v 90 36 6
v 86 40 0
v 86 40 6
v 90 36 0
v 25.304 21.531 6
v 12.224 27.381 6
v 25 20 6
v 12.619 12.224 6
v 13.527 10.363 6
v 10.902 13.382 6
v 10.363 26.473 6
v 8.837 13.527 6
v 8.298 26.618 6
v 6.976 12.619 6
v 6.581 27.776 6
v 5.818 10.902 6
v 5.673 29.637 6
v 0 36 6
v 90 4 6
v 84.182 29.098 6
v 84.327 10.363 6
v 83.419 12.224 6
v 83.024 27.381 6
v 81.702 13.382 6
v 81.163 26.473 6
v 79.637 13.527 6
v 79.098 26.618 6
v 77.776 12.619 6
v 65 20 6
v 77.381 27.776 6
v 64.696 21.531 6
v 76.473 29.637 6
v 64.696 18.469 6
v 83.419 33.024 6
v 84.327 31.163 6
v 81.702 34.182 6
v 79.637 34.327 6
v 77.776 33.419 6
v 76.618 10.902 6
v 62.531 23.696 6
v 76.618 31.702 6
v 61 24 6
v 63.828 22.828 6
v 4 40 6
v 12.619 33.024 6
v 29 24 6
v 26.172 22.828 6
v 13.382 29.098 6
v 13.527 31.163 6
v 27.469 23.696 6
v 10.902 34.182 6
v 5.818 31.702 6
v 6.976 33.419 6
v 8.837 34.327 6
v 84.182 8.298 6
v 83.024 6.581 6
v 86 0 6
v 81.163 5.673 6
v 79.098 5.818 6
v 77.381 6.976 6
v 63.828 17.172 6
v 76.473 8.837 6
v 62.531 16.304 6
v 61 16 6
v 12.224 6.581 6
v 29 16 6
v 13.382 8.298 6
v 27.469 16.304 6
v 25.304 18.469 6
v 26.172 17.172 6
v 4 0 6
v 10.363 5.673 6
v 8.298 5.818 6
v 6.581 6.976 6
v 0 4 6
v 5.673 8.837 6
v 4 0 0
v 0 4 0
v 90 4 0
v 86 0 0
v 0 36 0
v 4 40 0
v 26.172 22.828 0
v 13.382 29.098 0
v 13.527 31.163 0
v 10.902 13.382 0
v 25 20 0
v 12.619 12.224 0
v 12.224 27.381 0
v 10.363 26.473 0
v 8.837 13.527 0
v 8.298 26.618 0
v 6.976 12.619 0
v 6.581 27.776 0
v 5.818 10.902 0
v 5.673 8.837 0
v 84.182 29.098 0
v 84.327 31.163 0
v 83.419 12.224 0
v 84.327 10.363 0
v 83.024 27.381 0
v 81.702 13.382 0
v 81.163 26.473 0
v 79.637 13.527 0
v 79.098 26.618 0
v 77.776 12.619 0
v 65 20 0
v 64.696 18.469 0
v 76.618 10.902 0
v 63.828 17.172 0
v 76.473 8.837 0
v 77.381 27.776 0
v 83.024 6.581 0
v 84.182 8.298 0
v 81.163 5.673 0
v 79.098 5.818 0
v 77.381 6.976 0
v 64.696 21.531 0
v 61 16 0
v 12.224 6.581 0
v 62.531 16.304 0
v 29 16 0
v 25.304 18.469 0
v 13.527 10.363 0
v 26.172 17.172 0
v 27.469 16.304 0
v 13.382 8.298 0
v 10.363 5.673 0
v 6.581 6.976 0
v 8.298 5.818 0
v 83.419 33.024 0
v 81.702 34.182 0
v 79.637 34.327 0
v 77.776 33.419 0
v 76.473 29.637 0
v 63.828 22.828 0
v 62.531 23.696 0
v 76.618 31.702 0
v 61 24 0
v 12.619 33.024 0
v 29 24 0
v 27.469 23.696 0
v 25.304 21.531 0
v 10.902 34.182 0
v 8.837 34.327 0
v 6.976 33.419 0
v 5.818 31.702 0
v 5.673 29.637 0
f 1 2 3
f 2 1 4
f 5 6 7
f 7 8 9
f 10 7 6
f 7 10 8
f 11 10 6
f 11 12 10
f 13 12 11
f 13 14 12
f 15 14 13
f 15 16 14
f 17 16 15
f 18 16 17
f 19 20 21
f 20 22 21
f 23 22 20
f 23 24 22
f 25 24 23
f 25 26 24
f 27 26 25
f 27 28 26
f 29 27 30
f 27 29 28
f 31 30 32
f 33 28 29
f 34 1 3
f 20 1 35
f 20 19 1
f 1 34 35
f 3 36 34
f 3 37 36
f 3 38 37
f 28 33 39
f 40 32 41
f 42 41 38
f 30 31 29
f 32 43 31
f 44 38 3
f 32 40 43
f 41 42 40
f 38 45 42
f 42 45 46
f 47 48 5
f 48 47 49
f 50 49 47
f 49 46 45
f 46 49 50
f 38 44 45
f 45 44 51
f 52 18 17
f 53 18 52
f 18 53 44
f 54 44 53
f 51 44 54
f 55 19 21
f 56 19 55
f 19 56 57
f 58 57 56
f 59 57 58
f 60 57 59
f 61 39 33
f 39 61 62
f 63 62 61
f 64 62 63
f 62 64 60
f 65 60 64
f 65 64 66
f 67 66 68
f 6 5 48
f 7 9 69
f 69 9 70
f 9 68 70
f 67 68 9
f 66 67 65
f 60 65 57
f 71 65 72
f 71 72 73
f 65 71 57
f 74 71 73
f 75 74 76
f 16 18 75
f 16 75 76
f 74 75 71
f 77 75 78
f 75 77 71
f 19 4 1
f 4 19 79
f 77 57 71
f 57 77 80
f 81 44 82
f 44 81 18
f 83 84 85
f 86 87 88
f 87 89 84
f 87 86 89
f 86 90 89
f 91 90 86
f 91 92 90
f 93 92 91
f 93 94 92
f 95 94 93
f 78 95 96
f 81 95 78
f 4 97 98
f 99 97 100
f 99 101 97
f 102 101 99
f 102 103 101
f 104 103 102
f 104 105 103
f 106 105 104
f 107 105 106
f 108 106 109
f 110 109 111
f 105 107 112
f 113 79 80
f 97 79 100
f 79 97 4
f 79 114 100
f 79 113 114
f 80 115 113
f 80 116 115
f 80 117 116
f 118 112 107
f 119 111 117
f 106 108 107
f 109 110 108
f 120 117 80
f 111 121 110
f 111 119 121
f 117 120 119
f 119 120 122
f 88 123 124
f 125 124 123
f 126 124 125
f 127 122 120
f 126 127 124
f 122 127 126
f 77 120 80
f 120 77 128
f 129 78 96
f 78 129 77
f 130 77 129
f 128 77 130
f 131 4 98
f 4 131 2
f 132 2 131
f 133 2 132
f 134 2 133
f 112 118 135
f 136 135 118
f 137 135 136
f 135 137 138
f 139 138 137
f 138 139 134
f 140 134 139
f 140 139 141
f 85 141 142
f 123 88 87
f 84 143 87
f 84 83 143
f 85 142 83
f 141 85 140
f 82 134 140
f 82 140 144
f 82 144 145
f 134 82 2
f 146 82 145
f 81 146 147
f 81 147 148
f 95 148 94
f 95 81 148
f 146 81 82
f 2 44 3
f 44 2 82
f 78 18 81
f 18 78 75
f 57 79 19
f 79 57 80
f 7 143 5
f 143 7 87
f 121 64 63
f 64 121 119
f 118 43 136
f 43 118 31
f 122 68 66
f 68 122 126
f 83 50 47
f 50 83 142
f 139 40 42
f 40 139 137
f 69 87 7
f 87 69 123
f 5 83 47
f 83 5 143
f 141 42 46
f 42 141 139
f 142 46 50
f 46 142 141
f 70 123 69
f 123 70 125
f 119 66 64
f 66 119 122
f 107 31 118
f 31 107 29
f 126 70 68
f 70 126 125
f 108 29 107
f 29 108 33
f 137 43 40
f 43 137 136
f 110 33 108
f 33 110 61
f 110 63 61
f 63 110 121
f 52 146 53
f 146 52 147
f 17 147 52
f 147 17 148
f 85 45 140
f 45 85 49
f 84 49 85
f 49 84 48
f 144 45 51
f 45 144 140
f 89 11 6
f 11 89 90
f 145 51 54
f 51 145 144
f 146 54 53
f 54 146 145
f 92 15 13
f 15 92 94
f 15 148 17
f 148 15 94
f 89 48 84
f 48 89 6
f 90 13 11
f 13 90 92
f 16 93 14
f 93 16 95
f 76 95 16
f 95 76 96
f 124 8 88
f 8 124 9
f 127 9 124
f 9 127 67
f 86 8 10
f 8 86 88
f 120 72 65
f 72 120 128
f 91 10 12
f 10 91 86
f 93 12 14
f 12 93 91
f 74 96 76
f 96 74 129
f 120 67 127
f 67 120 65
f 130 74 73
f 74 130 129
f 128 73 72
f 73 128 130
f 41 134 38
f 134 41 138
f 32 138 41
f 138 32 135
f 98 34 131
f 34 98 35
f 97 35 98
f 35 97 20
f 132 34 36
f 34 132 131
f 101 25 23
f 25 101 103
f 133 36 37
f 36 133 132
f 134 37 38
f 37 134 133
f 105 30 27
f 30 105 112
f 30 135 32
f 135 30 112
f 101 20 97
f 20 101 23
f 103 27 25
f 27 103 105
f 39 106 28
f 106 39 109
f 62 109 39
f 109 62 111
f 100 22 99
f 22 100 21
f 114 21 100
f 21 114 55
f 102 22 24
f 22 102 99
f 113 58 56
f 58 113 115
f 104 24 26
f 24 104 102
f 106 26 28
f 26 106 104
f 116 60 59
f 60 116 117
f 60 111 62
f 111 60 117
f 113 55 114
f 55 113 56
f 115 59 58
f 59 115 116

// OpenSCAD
$fn = 32;

// ----------------------------------------------------------------------
// Bracket plate: slot plate 90 x 40
// ----------------------------------------------------------------------

// --- parameters (mm) ---
hole_r = 4;               // bolt hole radius
plate_t = 6;              // plate thickness, Z (extrusion height)
plate_l = 90;             // plate length
plate_w = 40;             // plate width
slot_l = 32;              // slot straight length
slot_r = 4;               // slot end radius

slot_len = slot_l + 2 * slot_r;
slot_w = 2 * slot_r;
hole_d2 = 2 * hole_r;

profile = [[4, 0], [86, 0], [90, 4], [90, 36], [86, 40], [4, 40], [0, 36], [0, 4]];  // primary outline, 8 points, counter clockwise
void_1 = [[61, 16], [62.531, 16.304], [63.828, 17.172], [64.696, 18.469], [65, 20], [64.696, 21.531], [63.828, 22.828], [62.531, 23.696], [61, 24], [29, 24], [27.469, 23.696], [26.172, 22.828], [25.304, 21.531], [25, 20], [25.304, 18.469], [26.172, 17.172], [27.469, 16.304], [29, 16]];  // grip slot, 18 points
void_2 = [[13.527, 31.163], [12.619, 33.024], [10.902, 34.182], [8.837, 34.327], [6.976, 33.419], [5.818, 31.702], [5.673, 29.637], [6.581, 27.776], [8.298, 26.618], [10.363, 26.473], [12.224, 27.381], [13.382, 29.098]];  // corner hole, 12 points
void_3 = [[13.527, 10.363], [12.619, 12.224], [10.902, 13.382], [8.837, 13.527], [6.976, 12.619], [5.818, 10.902], [5.673, 8.837], [6.581, 6.976], [8.298, 5.818], [10.363, 5.673], [12.224, 6.581], [13.382, 8.298]];  // corner hole, 12 points
void_4 = [[84.327, 31.163], [83.419, 33.024], [81.702, 34.182], [79.637, 34.327], [77.776, 33.419], [76.618, 31.702], [76.473, 29.637], [77.381, 27.776], [79.098, 26.618], [81.163, 26.473], [83.024, 27.381], [84.182, 29.098]];  // corner hole, 12 points
void_5 = [[84.327, 10.363], [83.419, 12.224], [81.702, 13.382], [79.637, 13.527], [77.776, 12.619], [76.618, 10.902], [76.473, 8.837], [77.381, 6.976], [79.098, 5.818], [81.163, 5.673], [83.024, 6.581], [84.182, 8.298]];  // corner hole, 12 points

// --- the one profile operation ---
difference() {
  linear_extrude(height = plate_t) polygon(points = profile);
  translate([0, 0, -1])
    linear_extrude(height = plate_t + 2) polygon(points = void_1);
  translate([0, 0, -1])
    linear_extrude(height = plate_t + 2) polygon(points = void_2);
  translate([0, 0, -1])
    linear_extrude(height = plate_t + 2) polygon(points = void_3);
  translate([0, 0, -1])
    linear_extrude(height = plate_t + 2) polygon(points = void_4);
  translate([0, 0, -1])
    linear_extrude(height = plate_t + 2) polygon(points = void_5);
}
